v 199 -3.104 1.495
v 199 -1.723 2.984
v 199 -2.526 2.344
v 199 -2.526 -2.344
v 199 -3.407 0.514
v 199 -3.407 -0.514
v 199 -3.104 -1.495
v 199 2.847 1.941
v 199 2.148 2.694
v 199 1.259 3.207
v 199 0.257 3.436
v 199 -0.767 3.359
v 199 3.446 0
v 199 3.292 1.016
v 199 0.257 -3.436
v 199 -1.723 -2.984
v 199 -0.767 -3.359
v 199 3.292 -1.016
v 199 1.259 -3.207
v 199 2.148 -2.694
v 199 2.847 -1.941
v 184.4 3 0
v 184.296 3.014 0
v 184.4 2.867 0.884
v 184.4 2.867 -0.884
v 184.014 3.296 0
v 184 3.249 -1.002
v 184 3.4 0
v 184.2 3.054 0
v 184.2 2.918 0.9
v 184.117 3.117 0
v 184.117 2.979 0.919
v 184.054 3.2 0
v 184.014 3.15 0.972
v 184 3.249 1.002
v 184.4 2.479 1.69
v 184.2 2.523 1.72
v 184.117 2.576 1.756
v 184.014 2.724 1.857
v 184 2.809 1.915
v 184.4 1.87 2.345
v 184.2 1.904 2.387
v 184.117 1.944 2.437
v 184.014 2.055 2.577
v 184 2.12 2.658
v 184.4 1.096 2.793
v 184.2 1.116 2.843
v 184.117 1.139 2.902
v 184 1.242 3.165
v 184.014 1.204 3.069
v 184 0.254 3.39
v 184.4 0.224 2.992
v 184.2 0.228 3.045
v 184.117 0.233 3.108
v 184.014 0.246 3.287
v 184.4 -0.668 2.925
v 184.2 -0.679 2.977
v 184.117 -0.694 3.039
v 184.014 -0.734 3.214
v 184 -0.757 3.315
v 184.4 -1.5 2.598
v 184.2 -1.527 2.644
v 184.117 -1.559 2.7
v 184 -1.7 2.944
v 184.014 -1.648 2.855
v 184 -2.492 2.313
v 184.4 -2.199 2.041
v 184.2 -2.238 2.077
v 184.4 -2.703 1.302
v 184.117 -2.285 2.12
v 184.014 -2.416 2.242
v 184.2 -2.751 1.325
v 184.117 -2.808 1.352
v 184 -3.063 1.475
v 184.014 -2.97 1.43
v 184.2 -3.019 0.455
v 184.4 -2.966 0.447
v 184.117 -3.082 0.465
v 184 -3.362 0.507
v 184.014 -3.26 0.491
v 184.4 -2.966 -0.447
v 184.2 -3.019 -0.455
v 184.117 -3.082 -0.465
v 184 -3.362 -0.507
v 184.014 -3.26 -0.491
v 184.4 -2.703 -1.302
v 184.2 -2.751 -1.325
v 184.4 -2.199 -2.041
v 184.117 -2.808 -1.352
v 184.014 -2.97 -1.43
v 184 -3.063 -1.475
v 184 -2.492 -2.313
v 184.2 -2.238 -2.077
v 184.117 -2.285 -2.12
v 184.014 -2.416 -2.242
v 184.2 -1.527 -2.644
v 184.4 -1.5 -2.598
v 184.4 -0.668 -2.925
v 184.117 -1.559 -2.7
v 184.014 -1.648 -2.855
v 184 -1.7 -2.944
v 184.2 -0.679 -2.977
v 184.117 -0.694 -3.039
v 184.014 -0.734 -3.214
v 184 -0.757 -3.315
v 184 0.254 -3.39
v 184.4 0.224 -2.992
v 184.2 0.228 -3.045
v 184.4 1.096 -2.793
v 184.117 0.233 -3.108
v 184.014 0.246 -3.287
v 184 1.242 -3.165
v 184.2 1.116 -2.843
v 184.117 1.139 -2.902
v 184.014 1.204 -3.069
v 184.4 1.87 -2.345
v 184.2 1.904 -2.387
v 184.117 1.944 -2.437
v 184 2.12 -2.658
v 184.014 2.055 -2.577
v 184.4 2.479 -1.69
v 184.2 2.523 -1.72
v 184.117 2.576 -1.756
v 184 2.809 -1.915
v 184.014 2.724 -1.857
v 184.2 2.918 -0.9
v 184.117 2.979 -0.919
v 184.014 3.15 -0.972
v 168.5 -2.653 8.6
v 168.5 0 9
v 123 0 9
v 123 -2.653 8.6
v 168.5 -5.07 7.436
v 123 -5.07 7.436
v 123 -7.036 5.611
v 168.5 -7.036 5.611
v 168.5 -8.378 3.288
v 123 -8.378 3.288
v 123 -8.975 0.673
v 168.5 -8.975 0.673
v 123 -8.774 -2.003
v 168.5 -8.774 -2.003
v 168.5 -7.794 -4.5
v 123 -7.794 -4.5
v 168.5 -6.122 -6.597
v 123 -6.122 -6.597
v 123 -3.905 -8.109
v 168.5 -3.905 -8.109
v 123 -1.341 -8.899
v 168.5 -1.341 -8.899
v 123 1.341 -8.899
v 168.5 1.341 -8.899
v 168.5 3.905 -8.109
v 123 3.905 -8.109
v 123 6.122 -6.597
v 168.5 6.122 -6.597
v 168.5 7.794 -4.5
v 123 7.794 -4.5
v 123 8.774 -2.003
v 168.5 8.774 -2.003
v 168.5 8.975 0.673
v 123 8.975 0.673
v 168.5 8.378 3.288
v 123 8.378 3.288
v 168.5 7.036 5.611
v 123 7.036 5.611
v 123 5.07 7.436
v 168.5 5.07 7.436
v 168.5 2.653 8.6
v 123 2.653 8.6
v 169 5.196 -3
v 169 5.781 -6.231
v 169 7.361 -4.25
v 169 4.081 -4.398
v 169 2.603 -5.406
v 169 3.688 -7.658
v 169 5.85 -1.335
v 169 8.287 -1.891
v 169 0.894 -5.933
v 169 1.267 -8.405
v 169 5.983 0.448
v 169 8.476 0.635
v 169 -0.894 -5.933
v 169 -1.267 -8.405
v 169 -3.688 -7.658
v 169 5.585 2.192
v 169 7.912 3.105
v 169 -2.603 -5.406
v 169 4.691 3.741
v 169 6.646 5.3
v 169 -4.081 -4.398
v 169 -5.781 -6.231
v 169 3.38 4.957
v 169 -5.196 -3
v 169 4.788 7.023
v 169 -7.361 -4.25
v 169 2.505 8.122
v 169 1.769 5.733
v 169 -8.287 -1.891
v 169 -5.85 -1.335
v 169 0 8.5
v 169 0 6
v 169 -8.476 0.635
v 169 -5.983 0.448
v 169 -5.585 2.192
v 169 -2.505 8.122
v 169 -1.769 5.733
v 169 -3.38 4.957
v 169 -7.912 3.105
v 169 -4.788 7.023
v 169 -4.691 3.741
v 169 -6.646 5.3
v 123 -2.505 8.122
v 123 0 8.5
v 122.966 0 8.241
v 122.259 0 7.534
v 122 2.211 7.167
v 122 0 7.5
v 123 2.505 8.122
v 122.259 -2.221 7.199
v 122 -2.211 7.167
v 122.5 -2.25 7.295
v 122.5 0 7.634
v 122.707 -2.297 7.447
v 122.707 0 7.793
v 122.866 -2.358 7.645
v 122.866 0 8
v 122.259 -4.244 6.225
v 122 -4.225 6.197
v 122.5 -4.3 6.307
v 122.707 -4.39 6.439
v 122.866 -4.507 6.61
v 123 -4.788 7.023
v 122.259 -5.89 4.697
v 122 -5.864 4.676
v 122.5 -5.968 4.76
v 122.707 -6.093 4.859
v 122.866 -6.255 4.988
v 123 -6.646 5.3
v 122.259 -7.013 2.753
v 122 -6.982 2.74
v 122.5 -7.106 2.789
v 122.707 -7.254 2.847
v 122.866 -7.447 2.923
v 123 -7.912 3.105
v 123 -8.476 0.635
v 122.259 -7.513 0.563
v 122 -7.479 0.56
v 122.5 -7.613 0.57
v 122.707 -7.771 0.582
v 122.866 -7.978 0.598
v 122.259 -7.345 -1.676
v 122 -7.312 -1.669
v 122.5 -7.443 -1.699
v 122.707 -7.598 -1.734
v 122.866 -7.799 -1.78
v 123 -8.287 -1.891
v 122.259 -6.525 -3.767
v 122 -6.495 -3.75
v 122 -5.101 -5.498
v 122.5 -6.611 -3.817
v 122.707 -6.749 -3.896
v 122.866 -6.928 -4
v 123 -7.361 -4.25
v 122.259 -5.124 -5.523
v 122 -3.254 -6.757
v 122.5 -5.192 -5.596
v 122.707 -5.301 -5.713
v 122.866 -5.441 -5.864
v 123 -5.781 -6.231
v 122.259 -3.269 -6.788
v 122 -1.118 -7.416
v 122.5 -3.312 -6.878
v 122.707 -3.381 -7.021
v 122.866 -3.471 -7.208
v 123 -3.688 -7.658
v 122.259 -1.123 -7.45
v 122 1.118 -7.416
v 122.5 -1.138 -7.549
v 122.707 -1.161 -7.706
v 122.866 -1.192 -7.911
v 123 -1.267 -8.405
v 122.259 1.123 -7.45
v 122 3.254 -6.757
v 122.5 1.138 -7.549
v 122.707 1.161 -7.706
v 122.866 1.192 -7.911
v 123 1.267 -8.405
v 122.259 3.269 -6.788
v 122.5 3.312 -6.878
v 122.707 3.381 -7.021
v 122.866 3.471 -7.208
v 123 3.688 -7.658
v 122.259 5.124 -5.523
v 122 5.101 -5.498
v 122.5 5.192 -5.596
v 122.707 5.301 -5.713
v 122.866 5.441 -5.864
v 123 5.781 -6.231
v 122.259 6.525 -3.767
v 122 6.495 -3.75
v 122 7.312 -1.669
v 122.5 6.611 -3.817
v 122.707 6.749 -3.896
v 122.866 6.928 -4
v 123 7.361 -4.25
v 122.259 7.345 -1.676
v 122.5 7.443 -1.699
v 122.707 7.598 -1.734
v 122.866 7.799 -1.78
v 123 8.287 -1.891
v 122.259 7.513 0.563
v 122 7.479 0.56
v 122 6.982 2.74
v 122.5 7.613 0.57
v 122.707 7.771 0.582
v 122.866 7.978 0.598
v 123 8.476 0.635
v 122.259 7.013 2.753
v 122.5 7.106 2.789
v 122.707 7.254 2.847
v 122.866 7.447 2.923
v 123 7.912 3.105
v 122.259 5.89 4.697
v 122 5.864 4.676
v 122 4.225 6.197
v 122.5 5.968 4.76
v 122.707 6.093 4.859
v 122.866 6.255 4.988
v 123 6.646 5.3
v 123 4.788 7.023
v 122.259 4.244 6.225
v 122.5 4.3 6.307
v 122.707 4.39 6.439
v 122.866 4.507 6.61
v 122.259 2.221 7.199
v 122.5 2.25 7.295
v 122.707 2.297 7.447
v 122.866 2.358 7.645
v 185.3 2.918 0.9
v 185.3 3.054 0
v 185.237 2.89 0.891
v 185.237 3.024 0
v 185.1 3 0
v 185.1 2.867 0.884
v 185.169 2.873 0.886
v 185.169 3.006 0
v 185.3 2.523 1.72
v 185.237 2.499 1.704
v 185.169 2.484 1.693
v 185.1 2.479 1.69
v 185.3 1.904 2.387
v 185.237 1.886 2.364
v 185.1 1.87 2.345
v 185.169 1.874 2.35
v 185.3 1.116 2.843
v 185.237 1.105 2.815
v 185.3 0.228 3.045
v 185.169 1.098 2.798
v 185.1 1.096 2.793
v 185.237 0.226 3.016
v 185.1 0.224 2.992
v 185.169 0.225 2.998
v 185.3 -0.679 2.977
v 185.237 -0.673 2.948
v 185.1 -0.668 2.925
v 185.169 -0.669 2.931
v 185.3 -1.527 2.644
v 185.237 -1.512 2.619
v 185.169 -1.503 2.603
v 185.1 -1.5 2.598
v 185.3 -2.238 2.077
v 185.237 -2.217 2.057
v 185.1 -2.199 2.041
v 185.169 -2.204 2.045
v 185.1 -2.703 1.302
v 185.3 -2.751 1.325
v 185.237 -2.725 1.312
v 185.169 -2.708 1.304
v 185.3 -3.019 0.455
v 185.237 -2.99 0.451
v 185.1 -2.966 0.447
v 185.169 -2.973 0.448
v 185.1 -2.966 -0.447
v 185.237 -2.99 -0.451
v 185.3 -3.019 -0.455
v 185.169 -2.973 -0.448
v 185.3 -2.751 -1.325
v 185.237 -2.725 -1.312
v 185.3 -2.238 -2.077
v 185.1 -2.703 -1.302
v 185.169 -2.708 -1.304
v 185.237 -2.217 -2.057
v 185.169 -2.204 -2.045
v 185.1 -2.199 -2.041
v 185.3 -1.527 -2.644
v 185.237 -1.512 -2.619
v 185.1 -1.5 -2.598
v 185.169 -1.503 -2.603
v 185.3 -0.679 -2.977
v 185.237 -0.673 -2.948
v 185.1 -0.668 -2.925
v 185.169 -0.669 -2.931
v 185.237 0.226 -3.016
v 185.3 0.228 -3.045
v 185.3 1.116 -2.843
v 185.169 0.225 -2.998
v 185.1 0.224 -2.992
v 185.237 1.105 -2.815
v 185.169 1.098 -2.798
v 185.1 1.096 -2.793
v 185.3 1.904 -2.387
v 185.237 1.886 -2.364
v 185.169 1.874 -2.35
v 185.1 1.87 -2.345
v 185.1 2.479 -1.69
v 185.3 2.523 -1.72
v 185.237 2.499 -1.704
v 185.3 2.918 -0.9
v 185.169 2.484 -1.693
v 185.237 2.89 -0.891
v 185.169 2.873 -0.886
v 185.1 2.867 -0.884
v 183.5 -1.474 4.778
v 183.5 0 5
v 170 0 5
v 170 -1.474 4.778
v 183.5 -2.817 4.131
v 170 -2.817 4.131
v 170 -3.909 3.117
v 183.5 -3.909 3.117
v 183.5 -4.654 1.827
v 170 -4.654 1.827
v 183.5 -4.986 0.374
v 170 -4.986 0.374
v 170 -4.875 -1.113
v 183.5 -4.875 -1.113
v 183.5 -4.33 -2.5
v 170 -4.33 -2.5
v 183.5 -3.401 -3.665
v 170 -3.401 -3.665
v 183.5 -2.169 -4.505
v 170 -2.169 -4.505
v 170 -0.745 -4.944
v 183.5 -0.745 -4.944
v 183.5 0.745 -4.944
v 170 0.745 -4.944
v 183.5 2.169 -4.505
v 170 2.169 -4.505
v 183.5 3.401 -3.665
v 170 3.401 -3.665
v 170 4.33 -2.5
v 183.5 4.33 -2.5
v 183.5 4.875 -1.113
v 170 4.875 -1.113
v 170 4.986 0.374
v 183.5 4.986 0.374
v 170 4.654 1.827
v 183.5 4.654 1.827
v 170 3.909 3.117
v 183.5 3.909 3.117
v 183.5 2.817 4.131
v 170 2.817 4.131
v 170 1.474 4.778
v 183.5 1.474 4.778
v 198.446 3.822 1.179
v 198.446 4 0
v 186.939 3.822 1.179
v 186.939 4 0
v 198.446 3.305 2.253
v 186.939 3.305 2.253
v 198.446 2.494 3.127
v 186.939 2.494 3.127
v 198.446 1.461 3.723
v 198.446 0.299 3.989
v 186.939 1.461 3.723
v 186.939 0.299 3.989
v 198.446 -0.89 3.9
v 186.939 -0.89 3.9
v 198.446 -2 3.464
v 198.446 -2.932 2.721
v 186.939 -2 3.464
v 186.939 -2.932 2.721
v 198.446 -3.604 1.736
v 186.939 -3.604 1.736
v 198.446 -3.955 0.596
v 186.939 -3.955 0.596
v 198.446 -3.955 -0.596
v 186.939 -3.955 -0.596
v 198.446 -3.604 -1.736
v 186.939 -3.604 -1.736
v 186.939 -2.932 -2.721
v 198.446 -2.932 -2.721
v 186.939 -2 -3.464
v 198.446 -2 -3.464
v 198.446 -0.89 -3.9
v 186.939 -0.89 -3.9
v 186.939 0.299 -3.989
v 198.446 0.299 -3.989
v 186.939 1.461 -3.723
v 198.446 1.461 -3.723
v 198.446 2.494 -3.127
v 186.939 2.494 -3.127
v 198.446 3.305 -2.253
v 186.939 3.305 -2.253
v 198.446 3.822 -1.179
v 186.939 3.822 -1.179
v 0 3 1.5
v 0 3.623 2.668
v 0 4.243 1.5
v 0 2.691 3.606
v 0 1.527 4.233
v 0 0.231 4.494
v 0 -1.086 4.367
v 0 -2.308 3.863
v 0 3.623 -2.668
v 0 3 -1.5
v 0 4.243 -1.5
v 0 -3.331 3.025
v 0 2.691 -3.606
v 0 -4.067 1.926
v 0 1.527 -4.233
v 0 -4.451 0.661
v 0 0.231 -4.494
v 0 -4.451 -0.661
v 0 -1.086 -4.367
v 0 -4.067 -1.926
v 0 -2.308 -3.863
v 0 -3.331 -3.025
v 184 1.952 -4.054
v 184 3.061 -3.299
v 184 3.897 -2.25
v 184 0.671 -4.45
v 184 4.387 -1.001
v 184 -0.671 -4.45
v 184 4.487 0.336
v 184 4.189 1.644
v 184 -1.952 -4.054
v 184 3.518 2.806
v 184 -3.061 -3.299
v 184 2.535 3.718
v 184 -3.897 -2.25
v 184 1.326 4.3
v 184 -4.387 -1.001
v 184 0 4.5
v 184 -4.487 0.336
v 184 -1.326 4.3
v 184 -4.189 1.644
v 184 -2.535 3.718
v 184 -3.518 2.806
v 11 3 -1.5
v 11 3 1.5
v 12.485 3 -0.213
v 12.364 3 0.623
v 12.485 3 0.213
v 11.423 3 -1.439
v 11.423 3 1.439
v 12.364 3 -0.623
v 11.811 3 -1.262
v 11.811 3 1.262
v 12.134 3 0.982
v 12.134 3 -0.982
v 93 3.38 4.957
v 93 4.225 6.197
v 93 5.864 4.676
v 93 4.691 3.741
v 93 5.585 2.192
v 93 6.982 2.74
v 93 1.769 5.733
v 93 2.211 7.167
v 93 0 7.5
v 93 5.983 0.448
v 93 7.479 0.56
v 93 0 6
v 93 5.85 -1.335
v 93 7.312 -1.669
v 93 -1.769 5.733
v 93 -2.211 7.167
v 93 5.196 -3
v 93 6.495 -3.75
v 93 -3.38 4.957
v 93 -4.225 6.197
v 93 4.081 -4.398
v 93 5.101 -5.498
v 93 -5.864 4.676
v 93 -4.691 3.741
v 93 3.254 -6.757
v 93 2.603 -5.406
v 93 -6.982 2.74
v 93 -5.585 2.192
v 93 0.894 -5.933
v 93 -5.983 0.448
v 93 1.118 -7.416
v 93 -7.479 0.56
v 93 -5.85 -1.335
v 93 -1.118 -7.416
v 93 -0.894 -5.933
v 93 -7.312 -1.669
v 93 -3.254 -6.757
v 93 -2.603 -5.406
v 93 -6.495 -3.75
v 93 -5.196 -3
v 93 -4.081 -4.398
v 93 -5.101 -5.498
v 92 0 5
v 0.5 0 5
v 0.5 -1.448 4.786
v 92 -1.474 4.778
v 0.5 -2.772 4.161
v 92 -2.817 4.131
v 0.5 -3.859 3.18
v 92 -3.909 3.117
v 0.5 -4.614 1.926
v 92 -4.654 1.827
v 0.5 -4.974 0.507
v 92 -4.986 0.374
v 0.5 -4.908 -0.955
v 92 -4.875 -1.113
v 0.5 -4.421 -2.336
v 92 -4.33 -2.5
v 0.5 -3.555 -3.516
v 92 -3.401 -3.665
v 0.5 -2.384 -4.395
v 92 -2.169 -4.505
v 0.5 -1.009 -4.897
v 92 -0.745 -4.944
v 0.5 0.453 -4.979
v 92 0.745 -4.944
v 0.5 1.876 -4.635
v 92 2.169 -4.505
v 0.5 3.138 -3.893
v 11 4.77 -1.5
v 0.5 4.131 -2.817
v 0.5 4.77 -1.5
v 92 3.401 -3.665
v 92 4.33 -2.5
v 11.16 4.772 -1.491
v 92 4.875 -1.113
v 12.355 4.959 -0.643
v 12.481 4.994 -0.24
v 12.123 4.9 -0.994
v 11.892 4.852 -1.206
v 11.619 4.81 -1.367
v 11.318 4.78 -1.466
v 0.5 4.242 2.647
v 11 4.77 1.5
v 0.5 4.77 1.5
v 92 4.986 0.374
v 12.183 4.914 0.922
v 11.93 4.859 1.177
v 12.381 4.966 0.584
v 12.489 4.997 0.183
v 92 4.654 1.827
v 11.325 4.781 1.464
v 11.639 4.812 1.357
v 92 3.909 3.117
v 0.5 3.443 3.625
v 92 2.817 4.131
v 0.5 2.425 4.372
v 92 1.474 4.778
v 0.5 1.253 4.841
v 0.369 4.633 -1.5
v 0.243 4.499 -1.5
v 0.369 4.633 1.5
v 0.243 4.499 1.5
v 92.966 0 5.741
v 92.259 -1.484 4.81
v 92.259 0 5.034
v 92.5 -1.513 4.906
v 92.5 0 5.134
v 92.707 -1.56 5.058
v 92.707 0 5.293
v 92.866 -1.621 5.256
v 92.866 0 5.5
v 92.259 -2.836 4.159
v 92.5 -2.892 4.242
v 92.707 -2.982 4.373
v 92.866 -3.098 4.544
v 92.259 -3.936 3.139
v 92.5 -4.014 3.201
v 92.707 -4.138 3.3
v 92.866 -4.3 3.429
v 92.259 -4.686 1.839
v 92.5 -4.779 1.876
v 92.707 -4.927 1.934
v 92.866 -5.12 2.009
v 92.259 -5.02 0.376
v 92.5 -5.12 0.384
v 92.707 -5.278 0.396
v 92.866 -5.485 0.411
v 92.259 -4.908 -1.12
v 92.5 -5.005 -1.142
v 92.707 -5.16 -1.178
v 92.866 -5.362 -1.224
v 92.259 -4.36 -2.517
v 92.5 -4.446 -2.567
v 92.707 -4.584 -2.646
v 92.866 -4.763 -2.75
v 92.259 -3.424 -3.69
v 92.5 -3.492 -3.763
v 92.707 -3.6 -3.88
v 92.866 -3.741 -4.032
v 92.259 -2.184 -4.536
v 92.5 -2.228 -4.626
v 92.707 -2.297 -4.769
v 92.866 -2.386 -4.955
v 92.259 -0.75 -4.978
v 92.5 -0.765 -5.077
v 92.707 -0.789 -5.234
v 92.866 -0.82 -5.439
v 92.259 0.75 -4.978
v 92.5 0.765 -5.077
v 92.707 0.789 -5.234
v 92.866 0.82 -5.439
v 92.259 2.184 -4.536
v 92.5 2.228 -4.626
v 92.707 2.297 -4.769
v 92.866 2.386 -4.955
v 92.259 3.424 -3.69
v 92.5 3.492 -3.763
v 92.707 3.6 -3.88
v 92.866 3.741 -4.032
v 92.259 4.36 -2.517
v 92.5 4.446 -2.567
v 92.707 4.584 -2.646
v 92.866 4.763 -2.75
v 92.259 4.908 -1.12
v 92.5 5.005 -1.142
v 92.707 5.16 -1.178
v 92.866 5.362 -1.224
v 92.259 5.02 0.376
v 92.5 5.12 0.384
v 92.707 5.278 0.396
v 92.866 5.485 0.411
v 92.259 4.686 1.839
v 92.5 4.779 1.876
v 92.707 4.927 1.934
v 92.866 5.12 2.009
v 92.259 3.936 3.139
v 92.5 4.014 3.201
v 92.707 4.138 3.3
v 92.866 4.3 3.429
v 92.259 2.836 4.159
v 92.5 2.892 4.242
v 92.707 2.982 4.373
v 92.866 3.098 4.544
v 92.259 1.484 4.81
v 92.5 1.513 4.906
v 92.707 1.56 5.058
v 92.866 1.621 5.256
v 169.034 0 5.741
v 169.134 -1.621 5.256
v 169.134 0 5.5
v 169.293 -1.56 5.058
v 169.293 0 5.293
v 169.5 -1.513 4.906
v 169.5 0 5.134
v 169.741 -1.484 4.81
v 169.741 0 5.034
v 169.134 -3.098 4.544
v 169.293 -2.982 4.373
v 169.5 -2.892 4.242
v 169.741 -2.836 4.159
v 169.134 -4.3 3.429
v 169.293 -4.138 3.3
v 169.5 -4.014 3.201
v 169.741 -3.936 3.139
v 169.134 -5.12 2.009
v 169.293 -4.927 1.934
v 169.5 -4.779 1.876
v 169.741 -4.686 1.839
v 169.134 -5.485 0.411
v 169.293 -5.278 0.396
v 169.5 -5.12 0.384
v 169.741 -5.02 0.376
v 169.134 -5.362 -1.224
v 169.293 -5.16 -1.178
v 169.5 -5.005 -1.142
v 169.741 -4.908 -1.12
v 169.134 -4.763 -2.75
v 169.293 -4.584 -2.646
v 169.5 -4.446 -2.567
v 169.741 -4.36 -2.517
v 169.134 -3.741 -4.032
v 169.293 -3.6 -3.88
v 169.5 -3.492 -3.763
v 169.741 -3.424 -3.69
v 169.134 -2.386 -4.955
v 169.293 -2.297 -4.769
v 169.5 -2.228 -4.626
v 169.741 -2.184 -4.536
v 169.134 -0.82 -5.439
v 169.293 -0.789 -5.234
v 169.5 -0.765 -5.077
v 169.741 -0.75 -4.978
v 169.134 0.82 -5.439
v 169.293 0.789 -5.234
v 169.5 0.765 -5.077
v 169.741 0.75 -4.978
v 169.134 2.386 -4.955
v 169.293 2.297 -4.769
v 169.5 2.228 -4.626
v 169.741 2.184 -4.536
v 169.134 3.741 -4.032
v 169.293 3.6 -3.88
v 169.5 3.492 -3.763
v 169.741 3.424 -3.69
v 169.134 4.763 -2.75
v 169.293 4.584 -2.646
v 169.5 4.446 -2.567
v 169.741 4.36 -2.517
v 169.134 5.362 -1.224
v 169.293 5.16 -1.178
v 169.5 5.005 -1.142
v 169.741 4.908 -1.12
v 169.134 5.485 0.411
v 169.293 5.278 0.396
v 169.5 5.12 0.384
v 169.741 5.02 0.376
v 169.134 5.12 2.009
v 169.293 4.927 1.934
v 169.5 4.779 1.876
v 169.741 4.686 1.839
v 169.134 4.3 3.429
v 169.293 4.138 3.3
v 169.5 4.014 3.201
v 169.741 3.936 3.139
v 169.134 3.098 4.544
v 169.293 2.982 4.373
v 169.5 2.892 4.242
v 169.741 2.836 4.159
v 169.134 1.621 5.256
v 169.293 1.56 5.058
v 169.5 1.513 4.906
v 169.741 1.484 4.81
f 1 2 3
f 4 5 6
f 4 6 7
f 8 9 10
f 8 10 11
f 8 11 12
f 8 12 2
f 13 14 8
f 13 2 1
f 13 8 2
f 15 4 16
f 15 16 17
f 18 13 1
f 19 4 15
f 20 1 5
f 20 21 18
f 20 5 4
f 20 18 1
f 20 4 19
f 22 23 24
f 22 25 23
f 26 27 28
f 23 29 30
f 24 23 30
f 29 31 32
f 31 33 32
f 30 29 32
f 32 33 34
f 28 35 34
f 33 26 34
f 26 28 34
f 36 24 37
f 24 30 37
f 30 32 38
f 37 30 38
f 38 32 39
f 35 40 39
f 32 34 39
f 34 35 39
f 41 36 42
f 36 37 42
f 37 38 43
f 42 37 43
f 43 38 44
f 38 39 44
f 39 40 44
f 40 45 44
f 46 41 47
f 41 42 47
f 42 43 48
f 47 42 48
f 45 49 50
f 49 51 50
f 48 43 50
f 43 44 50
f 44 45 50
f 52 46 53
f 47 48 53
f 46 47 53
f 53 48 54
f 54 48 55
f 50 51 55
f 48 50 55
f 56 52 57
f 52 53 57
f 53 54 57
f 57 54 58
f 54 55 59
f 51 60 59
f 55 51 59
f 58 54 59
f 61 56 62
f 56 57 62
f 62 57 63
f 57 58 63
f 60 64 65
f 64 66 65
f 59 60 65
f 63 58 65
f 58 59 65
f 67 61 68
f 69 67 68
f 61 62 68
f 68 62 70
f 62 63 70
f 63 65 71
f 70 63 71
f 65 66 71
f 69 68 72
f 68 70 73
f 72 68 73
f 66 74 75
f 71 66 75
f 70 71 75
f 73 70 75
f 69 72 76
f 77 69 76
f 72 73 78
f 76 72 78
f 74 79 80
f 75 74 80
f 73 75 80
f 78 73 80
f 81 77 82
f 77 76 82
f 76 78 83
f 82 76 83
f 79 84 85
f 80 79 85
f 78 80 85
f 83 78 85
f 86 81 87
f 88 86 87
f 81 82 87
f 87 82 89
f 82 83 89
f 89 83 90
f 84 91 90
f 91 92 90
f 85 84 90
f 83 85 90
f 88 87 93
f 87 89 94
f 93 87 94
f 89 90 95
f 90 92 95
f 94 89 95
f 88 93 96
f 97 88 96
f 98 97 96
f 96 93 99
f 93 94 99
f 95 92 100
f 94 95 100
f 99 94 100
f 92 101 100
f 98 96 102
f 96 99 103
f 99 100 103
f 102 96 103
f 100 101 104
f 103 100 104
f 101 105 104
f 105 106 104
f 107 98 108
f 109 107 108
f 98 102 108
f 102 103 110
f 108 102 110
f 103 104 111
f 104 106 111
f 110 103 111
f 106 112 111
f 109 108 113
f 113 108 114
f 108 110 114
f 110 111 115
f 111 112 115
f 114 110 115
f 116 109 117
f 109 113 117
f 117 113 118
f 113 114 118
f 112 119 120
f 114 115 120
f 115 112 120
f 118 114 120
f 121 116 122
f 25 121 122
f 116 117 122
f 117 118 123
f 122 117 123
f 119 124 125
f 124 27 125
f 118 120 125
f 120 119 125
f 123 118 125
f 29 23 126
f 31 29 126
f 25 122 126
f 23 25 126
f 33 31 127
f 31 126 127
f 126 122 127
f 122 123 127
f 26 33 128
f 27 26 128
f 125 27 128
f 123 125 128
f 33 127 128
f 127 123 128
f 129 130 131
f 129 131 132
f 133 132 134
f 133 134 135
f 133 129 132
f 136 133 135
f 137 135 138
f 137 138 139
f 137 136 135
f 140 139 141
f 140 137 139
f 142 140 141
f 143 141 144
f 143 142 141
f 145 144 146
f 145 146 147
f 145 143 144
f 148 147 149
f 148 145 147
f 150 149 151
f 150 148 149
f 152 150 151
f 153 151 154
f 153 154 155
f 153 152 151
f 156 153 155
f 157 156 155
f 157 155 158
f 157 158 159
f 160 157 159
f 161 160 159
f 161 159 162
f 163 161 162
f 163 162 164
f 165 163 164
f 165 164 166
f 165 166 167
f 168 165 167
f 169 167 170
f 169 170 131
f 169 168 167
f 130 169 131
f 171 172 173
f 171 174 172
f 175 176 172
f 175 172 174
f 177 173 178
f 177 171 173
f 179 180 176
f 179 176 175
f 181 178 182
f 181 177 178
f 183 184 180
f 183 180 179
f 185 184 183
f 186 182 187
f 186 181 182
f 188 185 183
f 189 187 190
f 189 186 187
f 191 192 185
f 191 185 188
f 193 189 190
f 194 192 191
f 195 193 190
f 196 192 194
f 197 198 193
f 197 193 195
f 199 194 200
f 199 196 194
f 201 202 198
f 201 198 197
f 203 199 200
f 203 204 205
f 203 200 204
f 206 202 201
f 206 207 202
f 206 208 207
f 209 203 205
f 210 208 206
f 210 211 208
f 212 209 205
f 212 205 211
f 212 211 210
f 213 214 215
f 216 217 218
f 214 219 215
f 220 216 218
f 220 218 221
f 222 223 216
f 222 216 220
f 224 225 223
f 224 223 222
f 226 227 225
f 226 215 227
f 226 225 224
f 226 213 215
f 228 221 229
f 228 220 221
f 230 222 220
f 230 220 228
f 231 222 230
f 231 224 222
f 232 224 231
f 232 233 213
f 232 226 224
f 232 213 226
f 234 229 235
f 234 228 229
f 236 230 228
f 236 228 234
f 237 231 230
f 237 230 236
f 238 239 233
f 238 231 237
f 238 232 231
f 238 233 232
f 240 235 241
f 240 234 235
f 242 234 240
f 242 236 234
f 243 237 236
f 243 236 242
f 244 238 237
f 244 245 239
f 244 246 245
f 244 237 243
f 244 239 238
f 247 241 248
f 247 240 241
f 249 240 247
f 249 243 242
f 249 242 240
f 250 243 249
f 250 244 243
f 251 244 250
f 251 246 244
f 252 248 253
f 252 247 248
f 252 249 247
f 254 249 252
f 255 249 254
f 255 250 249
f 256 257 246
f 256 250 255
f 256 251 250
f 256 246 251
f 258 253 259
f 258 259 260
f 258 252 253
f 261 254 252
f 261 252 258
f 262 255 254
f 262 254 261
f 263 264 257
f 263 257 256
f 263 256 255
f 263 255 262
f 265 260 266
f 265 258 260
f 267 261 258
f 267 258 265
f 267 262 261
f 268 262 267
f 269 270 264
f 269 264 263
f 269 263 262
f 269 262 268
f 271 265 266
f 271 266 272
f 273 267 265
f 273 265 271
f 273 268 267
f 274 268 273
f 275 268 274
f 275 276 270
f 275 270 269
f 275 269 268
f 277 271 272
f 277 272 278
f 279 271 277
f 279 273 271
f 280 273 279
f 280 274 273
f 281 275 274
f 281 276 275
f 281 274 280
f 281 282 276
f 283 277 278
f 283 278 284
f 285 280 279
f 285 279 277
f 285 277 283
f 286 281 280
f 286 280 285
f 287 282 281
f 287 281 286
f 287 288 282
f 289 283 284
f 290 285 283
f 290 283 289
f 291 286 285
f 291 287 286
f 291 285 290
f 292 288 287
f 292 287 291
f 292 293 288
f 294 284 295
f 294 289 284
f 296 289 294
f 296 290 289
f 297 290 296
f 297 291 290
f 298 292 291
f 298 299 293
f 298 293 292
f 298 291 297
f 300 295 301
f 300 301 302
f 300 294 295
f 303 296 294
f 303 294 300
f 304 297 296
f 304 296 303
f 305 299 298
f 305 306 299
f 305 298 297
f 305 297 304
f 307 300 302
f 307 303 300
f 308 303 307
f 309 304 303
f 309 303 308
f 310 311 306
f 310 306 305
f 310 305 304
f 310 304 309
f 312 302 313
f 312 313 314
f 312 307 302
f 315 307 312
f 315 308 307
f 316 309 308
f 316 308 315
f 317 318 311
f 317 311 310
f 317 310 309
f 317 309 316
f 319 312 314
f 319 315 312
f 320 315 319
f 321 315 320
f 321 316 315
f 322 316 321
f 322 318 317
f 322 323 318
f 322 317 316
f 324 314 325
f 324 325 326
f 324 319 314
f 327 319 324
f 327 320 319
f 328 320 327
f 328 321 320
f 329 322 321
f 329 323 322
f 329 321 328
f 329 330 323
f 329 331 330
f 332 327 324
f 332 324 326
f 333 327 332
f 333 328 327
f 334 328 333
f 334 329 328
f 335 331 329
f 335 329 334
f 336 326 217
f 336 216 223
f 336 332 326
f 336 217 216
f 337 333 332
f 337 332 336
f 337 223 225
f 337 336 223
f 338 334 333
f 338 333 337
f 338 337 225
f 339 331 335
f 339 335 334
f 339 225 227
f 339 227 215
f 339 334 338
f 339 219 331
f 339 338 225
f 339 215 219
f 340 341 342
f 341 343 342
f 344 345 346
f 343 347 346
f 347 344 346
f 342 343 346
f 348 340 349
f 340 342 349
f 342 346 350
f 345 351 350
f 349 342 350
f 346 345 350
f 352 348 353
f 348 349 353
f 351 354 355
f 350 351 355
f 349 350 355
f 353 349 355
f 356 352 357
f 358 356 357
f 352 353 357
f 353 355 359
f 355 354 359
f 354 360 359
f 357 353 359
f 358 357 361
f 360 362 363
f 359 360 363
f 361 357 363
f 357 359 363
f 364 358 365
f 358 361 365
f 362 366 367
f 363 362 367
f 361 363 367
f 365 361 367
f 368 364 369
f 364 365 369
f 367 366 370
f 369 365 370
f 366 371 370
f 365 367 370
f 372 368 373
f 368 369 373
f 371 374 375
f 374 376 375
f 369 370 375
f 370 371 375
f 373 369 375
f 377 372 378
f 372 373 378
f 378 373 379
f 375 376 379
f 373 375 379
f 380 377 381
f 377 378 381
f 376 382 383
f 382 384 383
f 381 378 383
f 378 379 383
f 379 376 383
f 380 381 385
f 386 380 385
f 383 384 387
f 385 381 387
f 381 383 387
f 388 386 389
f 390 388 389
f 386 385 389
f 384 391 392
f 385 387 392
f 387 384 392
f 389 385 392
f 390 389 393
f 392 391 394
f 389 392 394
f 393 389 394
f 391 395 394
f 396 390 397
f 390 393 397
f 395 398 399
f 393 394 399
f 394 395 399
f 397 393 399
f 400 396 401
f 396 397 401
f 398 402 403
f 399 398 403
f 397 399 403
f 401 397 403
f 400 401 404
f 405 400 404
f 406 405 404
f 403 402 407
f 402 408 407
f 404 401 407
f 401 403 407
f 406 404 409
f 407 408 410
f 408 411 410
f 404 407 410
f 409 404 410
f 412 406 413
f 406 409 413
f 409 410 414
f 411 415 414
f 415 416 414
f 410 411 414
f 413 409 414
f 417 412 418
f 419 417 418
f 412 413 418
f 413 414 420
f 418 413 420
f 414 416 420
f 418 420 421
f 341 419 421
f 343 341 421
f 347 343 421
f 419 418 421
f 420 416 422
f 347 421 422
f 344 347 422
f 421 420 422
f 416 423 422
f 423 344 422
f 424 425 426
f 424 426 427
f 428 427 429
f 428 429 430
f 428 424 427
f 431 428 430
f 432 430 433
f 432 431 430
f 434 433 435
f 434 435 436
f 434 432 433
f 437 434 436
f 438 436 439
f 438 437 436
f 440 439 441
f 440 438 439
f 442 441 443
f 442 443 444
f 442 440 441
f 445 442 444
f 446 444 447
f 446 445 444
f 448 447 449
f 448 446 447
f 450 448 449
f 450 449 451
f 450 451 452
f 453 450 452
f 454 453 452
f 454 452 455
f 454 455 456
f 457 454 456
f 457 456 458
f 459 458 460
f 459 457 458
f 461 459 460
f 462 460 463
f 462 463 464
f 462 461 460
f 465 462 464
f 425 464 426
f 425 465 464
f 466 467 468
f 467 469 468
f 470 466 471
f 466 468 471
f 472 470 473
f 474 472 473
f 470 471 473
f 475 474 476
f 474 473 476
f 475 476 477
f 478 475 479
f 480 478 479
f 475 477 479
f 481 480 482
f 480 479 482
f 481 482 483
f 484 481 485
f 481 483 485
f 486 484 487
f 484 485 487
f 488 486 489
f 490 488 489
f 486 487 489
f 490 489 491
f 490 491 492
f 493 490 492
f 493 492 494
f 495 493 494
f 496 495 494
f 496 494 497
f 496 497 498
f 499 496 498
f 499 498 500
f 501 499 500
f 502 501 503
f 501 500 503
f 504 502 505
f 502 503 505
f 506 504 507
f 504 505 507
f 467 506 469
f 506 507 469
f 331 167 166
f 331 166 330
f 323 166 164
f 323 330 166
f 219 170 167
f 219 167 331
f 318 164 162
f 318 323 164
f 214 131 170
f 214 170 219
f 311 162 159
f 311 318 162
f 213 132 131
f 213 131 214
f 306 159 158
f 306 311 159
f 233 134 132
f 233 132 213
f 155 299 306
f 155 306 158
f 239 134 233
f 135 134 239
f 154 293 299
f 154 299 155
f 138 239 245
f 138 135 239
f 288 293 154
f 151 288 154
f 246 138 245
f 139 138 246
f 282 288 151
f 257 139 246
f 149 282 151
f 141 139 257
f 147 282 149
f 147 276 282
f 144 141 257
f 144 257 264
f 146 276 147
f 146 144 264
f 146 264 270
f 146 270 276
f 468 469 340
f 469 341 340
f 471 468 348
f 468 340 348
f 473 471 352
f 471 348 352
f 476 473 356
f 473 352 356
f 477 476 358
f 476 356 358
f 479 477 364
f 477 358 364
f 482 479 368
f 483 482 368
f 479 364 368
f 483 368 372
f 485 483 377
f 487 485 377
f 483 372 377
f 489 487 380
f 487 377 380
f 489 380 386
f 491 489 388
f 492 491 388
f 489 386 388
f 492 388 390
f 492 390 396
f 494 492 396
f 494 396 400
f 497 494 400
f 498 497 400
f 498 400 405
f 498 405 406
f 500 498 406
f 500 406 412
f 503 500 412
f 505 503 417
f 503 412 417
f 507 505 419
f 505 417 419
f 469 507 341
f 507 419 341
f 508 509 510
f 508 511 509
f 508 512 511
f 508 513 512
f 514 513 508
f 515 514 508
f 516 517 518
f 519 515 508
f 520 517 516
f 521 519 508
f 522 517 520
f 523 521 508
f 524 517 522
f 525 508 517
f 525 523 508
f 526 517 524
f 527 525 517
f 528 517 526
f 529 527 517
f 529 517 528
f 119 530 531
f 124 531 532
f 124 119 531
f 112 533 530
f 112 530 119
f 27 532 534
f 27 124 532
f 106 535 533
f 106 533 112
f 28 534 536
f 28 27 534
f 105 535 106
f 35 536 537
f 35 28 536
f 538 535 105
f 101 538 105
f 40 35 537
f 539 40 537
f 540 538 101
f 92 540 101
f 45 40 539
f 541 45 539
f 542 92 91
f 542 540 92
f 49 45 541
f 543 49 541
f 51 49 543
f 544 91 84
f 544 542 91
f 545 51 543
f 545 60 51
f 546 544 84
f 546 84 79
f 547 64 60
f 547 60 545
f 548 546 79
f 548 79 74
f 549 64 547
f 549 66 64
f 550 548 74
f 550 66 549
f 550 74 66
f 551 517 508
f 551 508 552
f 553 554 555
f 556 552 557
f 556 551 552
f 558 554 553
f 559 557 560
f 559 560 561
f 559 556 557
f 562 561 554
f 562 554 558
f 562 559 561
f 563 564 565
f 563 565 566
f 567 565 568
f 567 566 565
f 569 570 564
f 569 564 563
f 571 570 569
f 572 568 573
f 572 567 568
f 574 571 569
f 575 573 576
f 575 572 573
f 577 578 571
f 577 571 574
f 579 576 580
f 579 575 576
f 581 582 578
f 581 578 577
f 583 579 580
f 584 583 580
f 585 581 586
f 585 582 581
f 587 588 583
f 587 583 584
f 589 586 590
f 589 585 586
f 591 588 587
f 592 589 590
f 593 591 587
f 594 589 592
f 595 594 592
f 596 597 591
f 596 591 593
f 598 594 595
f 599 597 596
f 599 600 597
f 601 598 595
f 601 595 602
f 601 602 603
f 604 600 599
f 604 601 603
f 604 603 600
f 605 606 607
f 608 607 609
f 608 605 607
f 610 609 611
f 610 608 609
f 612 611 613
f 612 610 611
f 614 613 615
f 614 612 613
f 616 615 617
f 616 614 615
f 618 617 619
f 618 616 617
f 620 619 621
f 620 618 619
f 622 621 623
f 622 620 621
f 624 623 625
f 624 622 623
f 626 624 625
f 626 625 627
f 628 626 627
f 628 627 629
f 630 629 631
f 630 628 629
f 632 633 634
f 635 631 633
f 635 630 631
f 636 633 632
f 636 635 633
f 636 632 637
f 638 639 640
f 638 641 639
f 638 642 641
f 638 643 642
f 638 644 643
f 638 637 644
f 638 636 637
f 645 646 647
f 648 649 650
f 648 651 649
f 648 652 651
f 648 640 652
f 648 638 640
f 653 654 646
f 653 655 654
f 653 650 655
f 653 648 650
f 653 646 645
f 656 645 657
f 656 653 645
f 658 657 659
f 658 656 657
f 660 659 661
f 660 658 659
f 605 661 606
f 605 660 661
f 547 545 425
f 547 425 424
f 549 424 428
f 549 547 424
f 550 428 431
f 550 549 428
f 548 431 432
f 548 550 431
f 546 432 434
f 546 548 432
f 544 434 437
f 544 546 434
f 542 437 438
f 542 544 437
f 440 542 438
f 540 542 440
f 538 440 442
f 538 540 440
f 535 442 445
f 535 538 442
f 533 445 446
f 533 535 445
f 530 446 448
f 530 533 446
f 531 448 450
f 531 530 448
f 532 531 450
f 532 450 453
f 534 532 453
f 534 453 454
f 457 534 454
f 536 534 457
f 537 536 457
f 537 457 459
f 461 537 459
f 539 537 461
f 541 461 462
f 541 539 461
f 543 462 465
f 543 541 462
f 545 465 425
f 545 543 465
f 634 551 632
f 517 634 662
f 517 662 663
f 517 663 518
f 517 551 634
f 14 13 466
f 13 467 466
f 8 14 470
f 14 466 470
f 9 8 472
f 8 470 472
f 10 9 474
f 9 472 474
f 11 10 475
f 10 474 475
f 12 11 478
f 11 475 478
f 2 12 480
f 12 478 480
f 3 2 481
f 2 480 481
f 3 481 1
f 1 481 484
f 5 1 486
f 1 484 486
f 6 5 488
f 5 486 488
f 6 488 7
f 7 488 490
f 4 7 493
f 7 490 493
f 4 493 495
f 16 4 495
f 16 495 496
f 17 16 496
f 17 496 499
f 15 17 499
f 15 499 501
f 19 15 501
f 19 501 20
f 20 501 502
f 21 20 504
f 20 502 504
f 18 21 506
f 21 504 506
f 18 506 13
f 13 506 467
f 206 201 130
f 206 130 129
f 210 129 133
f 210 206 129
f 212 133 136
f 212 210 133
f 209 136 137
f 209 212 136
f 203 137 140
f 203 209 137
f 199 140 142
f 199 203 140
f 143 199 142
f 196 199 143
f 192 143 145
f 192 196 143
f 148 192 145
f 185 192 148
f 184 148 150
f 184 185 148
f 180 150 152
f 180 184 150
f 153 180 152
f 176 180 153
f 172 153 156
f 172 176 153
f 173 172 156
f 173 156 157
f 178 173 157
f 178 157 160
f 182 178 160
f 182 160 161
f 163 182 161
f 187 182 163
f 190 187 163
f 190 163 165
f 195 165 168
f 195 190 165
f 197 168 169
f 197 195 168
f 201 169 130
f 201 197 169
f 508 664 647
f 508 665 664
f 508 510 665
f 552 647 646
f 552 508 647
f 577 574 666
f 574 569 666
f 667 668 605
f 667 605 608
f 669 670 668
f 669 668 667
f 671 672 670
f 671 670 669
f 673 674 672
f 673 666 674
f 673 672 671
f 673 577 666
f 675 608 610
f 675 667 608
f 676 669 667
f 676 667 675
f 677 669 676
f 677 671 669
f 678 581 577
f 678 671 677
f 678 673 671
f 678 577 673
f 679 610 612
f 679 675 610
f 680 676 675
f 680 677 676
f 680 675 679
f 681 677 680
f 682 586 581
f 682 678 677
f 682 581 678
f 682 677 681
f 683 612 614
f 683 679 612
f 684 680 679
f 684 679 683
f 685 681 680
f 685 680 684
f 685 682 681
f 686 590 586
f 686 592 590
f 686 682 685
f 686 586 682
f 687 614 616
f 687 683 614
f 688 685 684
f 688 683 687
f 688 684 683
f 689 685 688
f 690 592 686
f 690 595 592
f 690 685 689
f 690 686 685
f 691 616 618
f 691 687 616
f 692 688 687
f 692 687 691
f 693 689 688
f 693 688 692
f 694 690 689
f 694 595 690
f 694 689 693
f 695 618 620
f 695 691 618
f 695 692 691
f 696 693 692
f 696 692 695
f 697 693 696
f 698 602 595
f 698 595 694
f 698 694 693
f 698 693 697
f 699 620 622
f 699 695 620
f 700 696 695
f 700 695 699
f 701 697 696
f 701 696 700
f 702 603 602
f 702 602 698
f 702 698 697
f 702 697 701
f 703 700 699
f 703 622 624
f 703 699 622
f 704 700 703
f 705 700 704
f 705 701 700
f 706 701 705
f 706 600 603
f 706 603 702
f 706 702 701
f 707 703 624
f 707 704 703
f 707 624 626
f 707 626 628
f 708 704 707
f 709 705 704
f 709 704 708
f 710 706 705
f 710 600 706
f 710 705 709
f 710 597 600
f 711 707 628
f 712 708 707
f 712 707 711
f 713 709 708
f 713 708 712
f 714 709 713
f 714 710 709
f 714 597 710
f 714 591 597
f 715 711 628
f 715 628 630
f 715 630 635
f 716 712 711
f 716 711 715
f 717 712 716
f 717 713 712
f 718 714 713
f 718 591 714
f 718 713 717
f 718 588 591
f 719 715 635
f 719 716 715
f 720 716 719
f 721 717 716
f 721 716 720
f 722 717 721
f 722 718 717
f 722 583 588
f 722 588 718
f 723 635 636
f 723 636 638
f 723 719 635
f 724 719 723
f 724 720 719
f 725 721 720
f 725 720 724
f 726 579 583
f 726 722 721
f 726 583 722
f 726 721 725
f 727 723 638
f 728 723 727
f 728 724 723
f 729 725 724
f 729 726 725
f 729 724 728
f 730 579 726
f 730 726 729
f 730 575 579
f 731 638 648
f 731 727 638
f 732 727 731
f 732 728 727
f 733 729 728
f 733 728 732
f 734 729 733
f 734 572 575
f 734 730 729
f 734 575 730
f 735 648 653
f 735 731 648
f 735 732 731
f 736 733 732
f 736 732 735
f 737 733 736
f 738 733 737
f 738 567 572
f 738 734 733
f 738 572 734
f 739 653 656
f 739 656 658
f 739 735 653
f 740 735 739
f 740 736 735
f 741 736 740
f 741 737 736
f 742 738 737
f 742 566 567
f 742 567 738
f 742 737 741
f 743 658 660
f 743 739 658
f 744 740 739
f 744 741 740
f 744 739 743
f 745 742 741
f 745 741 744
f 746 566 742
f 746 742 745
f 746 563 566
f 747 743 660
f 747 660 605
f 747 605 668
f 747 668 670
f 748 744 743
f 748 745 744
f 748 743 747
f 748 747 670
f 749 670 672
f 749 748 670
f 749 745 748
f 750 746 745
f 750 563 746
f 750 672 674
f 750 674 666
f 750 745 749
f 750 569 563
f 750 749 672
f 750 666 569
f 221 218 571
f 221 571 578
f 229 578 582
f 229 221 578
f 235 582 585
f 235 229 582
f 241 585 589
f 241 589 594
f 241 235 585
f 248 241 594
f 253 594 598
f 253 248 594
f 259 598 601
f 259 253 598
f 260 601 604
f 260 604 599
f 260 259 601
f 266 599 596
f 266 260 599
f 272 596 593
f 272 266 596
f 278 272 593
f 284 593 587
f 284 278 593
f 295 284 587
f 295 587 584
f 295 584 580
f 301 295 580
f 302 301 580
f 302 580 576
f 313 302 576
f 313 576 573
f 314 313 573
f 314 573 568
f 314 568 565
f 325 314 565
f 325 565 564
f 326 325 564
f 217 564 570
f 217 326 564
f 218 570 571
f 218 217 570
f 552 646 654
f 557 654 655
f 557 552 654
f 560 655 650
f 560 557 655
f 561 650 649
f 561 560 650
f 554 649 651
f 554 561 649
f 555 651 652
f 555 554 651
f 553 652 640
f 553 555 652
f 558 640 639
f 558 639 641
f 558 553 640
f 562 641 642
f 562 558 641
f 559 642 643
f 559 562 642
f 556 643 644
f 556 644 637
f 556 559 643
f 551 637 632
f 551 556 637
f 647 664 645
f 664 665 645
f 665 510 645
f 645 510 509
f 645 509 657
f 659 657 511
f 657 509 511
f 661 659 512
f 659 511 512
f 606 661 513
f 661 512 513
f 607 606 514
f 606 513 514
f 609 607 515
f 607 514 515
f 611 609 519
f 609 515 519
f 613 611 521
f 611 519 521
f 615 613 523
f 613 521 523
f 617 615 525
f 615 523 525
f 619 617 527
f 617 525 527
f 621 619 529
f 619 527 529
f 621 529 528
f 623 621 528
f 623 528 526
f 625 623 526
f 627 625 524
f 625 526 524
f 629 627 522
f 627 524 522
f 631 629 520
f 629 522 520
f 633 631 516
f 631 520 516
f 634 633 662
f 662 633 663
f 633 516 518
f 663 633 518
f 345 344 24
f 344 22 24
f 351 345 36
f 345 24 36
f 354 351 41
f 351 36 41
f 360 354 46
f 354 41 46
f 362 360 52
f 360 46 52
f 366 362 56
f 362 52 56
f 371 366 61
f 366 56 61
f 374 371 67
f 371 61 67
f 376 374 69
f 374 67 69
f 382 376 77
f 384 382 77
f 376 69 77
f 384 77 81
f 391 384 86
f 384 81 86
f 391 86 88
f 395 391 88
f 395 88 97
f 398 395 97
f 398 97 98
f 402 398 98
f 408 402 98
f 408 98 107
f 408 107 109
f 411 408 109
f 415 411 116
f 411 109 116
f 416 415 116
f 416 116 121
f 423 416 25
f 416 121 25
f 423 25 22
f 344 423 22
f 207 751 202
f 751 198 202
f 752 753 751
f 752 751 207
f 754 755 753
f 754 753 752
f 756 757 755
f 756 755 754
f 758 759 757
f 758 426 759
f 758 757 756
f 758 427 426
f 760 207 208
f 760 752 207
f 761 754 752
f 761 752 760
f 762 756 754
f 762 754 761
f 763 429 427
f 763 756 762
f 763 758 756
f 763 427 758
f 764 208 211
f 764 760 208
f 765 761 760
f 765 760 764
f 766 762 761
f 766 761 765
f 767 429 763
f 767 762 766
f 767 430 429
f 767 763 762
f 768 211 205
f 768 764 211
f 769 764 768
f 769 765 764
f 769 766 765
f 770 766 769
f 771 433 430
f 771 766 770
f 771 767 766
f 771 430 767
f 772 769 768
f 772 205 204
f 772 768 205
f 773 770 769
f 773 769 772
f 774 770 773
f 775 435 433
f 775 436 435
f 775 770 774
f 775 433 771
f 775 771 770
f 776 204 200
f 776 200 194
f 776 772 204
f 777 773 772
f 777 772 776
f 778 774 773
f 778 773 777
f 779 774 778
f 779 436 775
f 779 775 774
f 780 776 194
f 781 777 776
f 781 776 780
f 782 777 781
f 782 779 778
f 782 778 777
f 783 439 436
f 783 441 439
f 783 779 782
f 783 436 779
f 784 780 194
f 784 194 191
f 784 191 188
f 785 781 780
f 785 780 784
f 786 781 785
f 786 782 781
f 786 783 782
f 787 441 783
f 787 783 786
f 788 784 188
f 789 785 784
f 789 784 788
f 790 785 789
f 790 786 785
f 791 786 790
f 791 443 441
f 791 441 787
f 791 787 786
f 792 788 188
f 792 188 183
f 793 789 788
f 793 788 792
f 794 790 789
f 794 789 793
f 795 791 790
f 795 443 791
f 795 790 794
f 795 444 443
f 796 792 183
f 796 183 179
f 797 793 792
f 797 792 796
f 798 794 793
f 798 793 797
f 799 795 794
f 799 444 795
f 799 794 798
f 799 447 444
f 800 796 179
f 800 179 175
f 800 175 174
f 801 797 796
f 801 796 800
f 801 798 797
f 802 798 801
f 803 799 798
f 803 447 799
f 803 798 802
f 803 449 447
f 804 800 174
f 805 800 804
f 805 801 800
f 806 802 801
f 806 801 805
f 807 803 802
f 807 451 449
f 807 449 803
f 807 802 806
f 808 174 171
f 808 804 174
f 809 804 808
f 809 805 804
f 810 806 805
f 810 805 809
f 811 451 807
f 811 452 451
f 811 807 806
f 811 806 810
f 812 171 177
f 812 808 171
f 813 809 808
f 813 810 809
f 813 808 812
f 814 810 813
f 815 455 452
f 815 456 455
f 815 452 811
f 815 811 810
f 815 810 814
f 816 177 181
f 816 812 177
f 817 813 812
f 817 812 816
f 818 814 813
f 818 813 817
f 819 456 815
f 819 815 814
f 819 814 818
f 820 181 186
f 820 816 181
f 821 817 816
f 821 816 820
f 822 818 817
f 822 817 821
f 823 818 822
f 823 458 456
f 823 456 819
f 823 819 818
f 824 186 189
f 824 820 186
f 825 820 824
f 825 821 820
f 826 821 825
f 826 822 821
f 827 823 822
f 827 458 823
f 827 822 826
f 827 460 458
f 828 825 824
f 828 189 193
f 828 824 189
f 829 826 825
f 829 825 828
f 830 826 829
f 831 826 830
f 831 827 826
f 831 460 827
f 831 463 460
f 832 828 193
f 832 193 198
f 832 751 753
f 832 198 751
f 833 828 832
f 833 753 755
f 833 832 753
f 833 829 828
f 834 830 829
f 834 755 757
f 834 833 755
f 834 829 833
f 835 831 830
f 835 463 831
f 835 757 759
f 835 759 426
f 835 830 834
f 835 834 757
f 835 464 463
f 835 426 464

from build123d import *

# Parameters (mm, degrees)
CUT_EXTRUDE1_START  = 3
CUT_EXTRUDE1_DEPTH  = 10
FILLET1_R           = 1
CHAMFER1_SIZE       = 0.5
CHAMFER2_SIZE       = 0.5
SKETCH3_R           = 4.1
BOSS_EXTRUDE1_DEPTH = 15


# Read off the part's stored shape, not the designer's step: M8x1.0 Machine Threads Stud1
with BuildPart() as part:
    # Sketch1 → Revolve1 (revolve)
    with BuildSketch(Plane(origin=(0, 0, 0), x_dir=(1, 0, 0), z_dir=(0, 1, 0))):
        Polygon((0, 0), (0, -5), (93, -5), (93, -7.5), (123, -7.5), (123, -9), (169, -9), (169, -5), (184, -5), (184, 0), align=None)
    revolve(axis=Axis((0, 0, 0), (1, 0, 0)))

    # Sketch2 → Cut-Extrude1 (cut)
    with BuildSketch(Plane(origin=(0, 0, 0), x_dir=(1, 0, 0), z_dir=(0, 1, 0)).offset(CUT_EXTRUDE1_START)):
        with BuildLine():
            Line((-11, -1.5), (11, -1.5))
            ThreePointArc((11, -1.5), (12.5, 0), (11, 1.5))
            Line((11, 1.5), (-11, 1.5))
            Line((-11, 1.5), (-11, -1.5))
        make_face()
    extrude(amount=CUT_EXTRUDE1_DEPTH, mode=Mode.SUBTRACT)

    # Fillet1
    fillet1_edges = [part.edges().sort_by_distance(p)[0] for p in [
        (123, 0, -7.5),
        (93, 0, -5),
        (169, 0, -5),
    ]]
    fillet(fillet1_edges, radius=FILLET1_R)

    # Chamfer1
    chamfer1_edges = [part.edges().sort_by_distance(p)[0] for p in [
        (0, -4.031128874, -2.958039892),
    ]]
    chamfer(chamfer1_edges, length=CHAMFER1_SIZE)

    # Chamfer2
    chamfer2_edges = [part.edges().sort_by_distance(p)[0] for p in [
        (184, 0, -5),
        (169, 0, -9),
    ]]
    chamfer(chamfer2_edges, length=CHAMFER2_SIZE)

    # Sketch3 → Boss-Extrude1 (add)
    with BuildSketch(Plane(origin=(184, 0, 0), x_dir=(0, 0, -1), z_dir=(1, 0, 0))):
        Circle(SKETCH3_R)
    extrude(amount=BOSS_EXTRUDE1_DEPTH)

    # M8x1.0 Machine Threads Stud1 outline → M8x1.0 Machine Threads Stud1 (revolve, cut)
    with BuildSketch(Plane.YX):
        with BuildLine():
            ThreePointArc((3, 184.4), (3.117157288, 184.117157288), (3.4, 184))
            Line((3.4, 184), (4.1, 184))
            Line((4.1, 184), (4.1, 199))
            Line((4.1, 199), (3.4455, 199))
            Line((3.4455, 199), (4, 198.4455))
            Line((4, 198.4455), (4, 186.939230485))
            Line((4, 186.939230485), (3.053589838, 185.3))
            ThreePointArc((3.053589838, 185.3), (3.013629669, 185.203527618), (3, 185.1))
            Line((3, 185.1), (3, 184.4))
        make_face()
    revolve(axis=Axis((0, 0, 0), (1, 0, 0)), mode=Mode.SUBTRACT)


solid = part.part
